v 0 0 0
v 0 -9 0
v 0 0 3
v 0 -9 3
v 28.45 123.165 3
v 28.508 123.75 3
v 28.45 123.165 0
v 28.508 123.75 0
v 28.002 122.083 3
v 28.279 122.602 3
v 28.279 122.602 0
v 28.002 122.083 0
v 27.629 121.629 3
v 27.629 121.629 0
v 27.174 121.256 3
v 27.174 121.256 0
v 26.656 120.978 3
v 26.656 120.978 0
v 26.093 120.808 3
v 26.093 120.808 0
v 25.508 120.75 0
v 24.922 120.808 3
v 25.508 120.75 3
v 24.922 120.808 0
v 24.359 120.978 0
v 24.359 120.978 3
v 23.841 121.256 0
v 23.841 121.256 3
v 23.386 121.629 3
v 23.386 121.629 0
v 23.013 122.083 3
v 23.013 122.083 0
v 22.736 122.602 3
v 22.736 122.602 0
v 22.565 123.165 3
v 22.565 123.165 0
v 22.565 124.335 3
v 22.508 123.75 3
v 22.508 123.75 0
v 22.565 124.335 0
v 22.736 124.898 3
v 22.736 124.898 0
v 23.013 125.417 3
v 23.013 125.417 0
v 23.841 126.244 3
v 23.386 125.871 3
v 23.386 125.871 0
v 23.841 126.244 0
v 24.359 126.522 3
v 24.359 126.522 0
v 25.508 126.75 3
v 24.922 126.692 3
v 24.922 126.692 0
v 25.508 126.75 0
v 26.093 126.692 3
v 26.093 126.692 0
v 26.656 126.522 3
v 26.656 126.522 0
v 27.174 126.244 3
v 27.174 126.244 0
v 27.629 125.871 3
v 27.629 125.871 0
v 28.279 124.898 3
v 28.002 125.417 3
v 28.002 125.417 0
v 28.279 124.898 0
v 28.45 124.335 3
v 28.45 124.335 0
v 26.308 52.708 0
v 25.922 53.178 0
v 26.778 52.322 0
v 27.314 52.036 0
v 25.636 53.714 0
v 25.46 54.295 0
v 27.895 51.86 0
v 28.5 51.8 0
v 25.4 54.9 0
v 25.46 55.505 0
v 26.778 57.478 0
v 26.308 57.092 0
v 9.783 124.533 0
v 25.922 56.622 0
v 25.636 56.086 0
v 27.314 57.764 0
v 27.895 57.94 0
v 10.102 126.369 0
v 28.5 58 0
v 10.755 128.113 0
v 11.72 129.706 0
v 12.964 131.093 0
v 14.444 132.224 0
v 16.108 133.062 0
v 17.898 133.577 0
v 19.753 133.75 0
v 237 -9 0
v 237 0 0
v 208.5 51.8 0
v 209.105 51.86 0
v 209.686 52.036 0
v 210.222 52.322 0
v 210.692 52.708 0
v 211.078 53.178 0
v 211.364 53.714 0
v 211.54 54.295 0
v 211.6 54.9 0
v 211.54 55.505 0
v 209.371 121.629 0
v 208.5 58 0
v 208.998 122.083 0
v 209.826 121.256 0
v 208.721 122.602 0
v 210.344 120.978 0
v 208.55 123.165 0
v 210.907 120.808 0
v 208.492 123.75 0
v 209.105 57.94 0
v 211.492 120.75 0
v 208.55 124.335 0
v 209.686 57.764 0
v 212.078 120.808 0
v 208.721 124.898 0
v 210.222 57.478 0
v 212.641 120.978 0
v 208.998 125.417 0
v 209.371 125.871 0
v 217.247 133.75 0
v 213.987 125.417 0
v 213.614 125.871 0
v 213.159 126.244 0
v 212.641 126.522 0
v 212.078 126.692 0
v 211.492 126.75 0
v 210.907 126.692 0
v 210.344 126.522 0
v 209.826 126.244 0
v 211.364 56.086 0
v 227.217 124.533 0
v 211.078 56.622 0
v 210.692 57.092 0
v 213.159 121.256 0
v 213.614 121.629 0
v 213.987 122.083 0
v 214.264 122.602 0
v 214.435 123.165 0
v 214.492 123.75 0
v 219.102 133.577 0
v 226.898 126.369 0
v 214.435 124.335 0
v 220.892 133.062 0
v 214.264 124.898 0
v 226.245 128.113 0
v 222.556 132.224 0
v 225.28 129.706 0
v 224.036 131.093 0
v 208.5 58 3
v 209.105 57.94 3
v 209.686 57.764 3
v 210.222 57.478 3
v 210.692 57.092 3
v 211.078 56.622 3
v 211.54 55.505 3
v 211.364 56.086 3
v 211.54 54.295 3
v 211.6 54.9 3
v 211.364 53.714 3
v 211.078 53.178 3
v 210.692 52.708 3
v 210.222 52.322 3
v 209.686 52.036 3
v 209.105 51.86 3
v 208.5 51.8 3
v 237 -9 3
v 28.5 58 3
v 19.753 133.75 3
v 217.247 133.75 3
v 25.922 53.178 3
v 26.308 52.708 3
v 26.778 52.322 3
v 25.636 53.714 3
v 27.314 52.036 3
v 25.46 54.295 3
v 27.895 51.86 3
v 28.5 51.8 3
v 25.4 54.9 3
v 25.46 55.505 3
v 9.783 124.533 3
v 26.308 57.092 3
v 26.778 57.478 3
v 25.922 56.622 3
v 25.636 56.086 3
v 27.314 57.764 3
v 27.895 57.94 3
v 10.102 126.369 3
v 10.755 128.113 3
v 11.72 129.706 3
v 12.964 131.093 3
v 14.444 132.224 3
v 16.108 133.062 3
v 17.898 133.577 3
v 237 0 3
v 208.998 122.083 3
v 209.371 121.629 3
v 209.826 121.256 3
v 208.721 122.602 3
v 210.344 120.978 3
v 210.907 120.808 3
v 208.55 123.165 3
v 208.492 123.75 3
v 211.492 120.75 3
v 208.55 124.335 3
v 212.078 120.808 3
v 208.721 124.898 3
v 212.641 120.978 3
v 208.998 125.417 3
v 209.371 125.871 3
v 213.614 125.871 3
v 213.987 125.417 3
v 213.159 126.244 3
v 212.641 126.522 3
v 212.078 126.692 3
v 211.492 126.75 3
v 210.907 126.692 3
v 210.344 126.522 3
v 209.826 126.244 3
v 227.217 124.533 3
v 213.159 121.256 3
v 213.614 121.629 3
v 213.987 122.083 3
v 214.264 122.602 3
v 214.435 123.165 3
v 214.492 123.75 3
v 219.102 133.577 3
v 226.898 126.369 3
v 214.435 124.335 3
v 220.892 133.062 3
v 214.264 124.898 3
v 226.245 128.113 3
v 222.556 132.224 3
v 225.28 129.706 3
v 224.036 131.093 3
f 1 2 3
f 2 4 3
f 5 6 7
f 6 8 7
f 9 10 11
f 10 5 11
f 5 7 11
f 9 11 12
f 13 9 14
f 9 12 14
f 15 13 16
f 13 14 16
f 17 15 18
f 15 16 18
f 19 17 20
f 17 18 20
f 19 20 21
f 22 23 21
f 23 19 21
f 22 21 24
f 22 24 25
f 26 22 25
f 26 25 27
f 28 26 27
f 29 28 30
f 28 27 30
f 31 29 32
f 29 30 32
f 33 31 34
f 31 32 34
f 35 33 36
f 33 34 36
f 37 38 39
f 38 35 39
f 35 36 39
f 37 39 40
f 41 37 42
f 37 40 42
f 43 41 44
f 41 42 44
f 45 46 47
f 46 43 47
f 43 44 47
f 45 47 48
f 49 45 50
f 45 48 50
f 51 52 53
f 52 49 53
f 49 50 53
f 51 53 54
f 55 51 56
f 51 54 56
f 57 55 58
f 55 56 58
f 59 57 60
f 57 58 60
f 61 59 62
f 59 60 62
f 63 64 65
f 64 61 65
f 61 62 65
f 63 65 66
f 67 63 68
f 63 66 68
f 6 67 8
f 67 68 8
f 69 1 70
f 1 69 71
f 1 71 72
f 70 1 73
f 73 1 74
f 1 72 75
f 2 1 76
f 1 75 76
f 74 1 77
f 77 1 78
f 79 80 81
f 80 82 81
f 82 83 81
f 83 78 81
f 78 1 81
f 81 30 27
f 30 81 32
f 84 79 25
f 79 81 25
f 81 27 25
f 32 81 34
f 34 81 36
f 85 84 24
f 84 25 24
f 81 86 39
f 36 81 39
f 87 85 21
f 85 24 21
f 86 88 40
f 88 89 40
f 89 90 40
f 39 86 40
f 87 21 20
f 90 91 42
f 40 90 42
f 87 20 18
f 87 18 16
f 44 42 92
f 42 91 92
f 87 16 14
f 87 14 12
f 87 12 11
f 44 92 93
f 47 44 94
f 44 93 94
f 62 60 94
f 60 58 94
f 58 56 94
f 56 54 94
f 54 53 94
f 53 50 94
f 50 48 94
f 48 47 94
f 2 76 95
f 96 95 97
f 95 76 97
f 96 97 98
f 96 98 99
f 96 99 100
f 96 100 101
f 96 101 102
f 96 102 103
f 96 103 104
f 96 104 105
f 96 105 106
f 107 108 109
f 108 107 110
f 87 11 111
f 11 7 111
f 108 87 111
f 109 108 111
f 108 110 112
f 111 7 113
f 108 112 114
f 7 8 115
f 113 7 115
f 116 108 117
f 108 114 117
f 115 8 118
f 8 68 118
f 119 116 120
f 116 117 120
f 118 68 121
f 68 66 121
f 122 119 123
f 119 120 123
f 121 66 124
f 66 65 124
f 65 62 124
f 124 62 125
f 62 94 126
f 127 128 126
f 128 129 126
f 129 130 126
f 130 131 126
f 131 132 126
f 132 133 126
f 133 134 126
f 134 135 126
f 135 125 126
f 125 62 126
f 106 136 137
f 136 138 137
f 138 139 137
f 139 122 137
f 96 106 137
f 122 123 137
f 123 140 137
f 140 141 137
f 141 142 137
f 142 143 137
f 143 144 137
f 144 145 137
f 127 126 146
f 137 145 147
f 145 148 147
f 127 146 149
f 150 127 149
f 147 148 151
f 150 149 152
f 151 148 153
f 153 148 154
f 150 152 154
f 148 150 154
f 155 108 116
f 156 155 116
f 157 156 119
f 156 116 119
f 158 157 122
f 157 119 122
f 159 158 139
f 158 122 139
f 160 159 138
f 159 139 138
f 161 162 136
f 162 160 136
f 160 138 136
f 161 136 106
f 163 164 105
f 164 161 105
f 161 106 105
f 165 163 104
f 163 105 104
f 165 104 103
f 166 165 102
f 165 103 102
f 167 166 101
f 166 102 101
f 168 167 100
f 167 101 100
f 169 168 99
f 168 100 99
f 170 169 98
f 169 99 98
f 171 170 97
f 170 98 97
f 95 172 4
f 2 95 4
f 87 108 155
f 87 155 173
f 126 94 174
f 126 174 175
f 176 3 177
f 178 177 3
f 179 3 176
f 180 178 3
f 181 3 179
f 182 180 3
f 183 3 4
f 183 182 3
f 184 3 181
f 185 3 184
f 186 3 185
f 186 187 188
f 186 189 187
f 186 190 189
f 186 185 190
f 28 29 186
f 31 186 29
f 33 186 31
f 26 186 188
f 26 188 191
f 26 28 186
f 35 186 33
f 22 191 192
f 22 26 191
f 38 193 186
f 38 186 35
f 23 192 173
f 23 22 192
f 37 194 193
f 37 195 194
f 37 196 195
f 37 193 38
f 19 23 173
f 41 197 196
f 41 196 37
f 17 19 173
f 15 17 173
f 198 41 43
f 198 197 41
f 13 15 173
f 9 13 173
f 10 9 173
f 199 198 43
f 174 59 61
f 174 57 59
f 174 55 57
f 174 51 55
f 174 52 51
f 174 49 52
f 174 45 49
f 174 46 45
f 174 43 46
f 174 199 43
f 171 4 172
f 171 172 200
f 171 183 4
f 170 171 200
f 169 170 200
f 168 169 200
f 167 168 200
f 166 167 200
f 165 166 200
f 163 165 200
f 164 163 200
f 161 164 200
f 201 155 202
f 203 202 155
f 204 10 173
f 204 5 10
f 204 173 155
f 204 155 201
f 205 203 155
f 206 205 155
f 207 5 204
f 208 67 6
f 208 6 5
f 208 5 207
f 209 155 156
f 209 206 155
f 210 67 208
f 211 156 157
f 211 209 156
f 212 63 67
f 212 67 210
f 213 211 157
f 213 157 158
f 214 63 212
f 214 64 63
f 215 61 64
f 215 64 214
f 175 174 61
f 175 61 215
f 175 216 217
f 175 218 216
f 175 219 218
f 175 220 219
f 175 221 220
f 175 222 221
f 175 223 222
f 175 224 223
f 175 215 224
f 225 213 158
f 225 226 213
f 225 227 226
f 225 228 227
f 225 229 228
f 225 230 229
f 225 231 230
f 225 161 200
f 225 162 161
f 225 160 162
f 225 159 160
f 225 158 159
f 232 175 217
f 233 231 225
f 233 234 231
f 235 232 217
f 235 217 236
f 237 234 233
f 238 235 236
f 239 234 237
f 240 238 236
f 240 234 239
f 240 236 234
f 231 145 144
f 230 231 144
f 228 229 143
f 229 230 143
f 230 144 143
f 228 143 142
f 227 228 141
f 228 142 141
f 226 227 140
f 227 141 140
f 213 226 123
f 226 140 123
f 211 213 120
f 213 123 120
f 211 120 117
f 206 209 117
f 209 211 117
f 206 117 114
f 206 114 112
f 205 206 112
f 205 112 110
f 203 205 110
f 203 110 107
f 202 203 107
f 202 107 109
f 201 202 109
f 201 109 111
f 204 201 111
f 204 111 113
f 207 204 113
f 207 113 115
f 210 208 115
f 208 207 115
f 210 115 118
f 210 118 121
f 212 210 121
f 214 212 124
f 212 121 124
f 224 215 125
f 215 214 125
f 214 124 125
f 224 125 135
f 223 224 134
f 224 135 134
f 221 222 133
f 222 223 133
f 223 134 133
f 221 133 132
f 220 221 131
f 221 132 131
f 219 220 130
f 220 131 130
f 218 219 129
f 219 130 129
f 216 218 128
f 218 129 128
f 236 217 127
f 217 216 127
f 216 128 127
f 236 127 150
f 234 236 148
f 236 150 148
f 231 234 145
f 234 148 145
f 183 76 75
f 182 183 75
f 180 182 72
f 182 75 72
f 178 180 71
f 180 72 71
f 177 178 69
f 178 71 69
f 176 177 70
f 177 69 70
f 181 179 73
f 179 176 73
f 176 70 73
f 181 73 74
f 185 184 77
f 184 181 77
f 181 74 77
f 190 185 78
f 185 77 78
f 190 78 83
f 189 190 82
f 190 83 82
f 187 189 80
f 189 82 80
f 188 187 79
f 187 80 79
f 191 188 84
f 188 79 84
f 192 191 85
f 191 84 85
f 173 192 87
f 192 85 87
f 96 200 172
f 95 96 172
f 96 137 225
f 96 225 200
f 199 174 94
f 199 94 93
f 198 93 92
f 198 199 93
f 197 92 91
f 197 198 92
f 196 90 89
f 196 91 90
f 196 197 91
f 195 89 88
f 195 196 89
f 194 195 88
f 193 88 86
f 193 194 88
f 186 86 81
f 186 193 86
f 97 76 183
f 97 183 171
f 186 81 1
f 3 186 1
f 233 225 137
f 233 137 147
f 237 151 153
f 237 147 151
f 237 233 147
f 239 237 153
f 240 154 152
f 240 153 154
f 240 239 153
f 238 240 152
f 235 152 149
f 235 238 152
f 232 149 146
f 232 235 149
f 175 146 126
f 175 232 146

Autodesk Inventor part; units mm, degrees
ref_plane "YZ Plane" through (0, 0, 0) normal (1, 0, 0) x (0, 1, 0)
ref_plane "XZ Plane" through (0, 0, 0) normal (0, 1, 0) x (-1, 0, 0)
ref_plane "XY Plane" through (0, 0, 0) normal (0, 0, 1) x (1, 0, 0)
sketch "Sketch1" plane through (0, 0, 0) normal (0, 0, 1) x (1, 0, 0)
  line L0 (0, 0) -> (237, 0)
  line L1 (10.5075, 133.75) -> (226.4925, 133.75)
  line L2 (10.5075, 133.75) -> (0, 0)
  line L3 (226.4925, 133.75) -> (237, 0)
  circle A0 centre (25.5075, 123.75) radius 3
  line L4 (118.5, 191.0895) -> (118.5, 206.5913) construction
  circle A1 centre (211.4925, 123.75) radius 3
  line L5 (28.5, 54.9) -> (208.5, 54.9) construction
  line L6 (28.5, 51.8) -> (208.5, 51.8)
  line L7 (208.5, 58) -> (28.5, 58)
  arc A2 (28.5, 58) -> (28.5, 51.8) centre (28.5, 54.9) ccw
  arc A3 (208.5, 51.8) -> (208.5, 58) centre (208.5, 54.9) ccw
  point P0 (118.5, 133.75)
  point P1 (118.5, 0)
  point P2 (118.5, 198.8404)
  point P3 (118.5, 54.9)
  dimension "d0" = 237
  dimension "d1" = 215.985
  dimension "d2" = 133.75
  dimension "d3" = 6
  dimension "d4" = 10
  dimension "d5" = 15
  dimension "d8" = 6.2
  dimension "d9" = 81.95
  dimension "d10" = 180
extrude "Extrusion1" add sketch "Sketch1" along normal blind 3
sketch "Sketch2" plane through (0, 0, 3) normal (0, 0, 1) x (1, 0, 0)
  line L0 (0, 0) -> (237, 0)
  line L1 (237, 0) -> (237, -9)
  line L2 (237, -9) -> (0, -9)
  line L3 (0, -9) -> (0, 0)
  dimension "depth" = 9
extrude "Extrusion2" add sketch "Sketch2" against normal blind 3
fillet "Fillet1" radius 10 2 edges at (226.4925, 133.75, 1.5) (10.5075, 133.75, 1.5)
sketch "Sketch3" plane through (0, 0, 3) normal (0, 0, 1) x (1, 0, 0)
  line L0 (0, 0) -> (0, -9) projected
  line L1 (0, -9) -> (237, -9) projected
  spline S0 degree 4 poles (208.9384, 106.1179) (205.6345, 87.6966) (186.3734, 52.9377) (139.2784, 16.5104) (82.7331, 6.5959) (51.8588, 6.1179) knots 0 0 0 0 0 0.457223 1 1 1 1 1
  point P0 (199.8798, 81.1179)
  point P1 (180.3986, 56.1179)
  point P2 (147.52, 31.1179)
  point P3 (103.0387, 12.8166)
equation "\"raisedheight\" = 5"
equation "\"geargap\" = 0.2"
properties part number "mountback"
